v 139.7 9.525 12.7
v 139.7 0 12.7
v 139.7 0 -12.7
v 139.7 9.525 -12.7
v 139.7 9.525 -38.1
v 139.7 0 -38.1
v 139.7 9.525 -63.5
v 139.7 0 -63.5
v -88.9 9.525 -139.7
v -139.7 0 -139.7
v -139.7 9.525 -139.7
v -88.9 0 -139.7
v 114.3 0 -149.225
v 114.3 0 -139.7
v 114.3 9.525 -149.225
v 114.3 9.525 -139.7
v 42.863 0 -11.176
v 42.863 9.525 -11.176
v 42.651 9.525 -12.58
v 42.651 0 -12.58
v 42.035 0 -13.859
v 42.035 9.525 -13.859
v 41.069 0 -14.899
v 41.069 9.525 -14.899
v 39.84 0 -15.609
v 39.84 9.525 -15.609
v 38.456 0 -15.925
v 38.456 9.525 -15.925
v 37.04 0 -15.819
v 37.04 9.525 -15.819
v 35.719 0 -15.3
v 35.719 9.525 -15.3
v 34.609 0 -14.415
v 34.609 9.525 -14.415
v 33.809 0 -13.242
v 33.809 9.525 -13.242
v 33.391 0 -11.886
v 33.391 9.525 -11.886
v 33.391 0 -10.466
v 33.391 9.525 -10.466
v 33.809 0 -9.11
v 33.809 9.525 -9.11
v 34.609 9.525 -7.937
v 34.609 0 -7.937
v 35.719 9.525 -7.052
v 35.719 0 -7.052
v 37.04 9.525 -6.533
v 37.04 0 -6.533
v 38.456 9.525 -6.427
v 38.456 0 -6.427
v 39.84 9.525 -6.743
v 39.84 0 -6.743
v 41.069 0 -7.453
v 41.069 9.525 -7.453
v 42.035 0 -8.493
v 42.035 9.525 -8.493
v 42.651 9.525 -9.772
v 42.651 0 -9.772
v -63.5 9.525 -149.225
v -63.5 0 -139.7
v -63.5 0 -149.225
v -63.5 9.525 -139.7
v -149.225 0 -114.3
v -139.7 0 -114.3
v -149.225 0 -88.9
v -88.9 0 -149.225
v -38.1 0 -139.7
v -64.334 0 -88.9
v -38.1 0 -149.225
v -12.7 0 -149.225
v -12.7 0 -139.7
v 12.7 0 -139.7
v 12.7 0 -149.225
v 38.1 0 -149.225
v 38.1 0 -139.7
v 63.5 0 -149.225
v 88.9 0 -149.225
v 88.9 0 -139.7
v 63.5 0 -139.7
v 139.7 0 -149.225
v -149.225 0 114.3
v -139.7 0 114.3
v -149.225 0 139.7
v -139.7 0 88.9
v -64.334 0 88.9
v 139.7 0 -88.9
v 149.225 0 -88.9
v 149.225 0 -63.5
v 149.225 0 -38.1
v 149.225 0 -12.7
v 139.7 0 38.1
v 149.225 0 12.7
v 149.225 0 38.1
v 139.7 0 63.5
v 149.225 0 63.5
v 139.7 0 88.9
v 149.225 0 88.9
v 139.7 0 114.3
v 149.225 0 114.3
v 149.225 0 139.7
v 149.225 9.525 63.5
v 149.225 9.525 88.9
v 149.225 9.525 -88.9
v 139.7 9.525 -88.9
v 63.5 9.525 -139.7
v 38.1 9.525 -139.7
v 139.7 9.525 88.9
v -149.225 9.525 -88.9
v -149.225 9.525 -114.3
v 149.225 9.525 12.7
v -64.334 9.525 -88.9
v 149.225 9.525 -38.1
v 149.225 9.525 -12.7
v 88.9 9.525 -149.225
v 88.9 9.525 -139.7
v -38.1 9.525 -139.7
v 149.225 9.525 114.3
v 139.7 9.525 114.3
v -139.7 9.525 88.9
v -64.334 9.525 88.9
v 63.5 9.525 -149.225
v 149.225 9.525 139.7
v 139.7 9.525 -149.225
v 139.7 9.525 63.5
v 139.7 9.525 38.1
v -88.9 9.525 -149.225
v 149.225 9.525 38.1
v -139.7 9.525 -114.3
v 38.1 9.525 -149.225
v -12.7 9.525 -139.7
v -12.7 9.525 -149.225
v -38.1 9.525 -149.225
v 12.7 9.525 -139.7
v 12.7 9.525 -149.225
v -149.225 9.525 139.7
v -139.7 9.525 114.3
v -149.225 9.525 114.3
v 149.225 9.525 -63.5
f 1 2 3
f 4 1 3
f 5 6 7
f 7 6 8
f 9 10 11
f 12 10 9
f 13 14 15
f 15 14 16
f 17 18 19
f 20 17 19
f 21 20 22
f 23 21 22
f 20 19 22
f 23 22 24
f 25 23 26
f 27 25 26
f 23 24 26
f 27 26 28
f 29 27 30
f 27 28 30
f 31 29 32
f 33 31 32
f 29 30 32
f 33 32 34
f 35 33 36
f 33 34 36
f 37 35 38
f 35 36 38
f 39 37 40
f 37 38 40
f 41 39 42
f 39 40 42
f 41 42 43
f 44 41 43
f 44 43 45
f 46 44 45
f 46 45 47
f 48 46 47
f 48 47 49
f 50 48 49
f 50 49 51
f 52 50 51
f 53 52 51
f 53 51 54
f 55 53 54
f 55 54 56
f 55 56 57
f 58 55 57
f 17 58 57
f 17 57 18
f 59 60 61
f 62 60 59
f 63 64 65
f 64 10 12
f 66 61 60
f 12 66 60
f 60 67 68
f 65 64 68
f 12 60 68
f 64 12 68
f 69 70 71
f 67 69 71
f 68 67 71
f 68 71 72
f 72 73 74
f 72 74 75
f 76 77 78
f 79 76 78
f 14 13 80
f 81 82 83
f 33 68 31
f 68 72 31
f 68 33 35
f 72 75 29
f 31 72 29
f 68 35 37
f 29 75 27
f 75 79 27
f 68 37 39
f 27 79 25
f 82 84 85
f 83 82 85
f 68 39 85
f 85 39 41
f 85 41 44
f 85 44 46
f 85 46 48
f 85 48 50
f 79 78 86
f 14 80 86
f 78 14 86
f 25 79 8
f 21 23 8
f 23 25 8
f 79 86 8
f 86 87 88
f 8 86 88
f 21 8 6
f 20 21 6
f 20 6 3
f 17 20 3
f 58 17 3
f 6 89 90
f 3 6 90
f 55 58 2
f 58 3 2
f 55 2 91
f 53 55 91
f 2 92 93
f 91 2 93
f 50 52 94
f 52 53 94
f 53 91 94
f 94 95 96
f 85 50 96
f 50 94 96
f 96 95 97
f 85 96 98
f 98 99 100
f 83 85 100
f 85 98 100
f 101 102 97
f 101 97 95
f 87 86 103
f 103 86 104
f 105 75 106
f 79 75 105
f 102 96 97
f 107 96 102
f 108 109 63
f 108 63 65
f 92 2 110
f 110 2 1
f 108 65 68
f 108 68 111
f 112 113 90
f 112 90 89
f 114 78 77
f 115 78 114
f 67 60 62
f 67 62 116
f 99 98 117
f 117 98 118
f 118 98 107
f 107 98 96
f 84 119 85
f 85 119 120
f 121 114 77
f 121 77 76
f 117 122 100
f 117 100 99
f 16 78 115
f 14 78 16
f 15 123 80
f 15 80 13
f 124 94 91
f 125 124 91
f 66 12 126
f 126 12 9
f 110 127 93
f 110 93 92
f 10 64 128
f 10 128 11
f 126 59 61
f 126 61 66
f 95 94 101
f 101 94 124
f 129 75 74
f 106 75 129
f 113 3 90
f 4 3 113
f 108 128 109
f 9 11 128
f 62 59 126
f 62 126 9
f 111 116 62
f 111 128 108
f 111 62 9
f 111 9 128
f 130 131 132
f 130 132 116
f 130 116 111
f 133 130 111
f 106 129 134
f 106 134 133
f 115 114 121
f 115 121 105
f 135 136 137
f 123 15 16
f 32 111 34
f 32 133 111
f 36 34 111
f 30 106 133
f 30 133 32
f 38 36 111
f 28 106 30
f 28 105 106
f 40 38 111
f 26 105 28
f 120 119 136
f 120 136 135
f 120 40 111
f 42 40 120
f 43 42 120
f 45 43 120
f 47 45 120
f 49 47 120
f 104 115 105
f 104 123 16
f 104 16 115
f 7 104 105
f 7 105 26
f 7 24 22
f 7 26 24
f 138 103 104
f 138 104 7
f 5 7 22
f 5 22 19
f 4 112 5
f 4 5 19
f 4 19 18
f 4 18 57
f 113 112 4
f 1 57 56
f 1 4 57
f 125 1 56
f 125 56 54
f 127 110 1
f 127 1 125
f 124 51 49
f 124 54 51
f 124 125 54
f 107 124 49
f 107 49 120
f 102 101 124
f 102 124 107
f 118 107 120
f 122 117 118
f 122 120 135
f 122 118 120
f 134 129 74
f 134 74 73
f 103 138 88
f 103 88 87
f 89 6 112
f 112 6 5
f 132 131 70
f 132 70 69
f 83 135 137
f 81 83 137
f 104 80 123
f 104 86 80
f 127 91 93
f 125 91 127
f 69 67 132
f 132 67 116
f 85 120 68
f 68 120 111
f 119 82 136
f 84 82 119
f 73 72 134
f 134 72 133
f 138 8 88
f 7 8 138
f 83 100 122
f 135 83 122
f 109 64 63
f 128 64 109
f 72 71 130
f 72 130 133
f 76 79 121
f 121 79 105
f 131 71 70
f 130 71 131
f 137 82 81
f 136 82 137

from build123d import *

# Parameters (mm, degrees)
SKETCH1_W               = 279.4
SKETCH1_H               = 279.4
BOSS_EXTRUDE1_DEPTH     = 9.525
SKETCH2_W               = 25.4
SKETCH2_H               = 9.525
BOSS_EXTRUDE2_DEPTH     = 9.525
LPATTERN1_COUNT         = 5
LPATTERN1_PITCH         = 50.8
MIRROR1_COPY_1_SKETCH_W = 25.4
MIRROR1_COPY_1_SKETCH_H = 9.525
MIRROR1_COPY_1_DEPTH    = 9.525
MIRROR1_COPY_2_SKETCH_W = 25.4
MIRROR1_COPY_2_SKETCH_H = 9.525
MIRROR1_COPY_2_DEPTH    = 9.525
MIRROR1_COPY_3_SKETCH_W = 25.4
MIRROR1_COPY_3_SKETCH_H = 9.525
MIRROR1_COPY_3_DEPTH    = 9.525
MIRROR1_COPY_4_SKETCH_W = 25.4
MIRROR1_COPY_4_SKETCH_H = 9.525
MIRROR1_COPY_4_DEPTH    = 9.525
SKETCH3_W               = 25.4
SKETCH3_H               = 9.525
BOSS_EXTRUDE3_DEPTH     = 9.525
LPATTERN2_COUNT         = 5
LPATTERN2_PITCH         = 50.8
SKETCH6_R               = 4.7625
CUT_EXTRUDE1_DEPTH      = 10.525
SKETCH8_W               = 84.891093183
SKETCH8_H               = 177.8
CUT_EXTRUDE3_DEPTH      = 10.525
SKETCH9_W               = 25.4
SKETCH9_H               = 9.525
BOSS_EXTRUDE4_DEPTH     = 9.525


with BuildPart() as part:
    # Sketch1 → Boss-Extrude1 (new body)
    with BuildSketch(Plane(origin=(0, 0, 0), x_dir=(1, 0, 0), z_dir=(0, 1, 0))):
        Rectangle(SKETCH1_W, SKETCH1_H)
    extrude(amount=BOSS_EXTRUDE1_DEPTH)

    # Sketch2 → Boss-Extrude2 (add)
    with BuildSketch(Plane(origin=(139.7, 0, 0), x_dir=(0, 0, -1), z_dir=(1, 0, 0))):
        with Locations((-127, 4.7625)):
            Rectangle(SKETCH2_W, SKETCH2_H)
    boss_extrude2 = extrude(amount=BOSS_EXTRUDE2_DEPTH)

    # LPattern1: Boss-Extrude2 ×5
    with Locations(*[(0, 0, -i * LPATTERN1_PITCH) for i in range(1, LPATTERN1_COUNT)]):
        add(boss_extrude2)

    # Mirror1: Boss-Extrude2 across plane
    add(boss_extrude2.mirror(Plane(origin=(0, 0, 0), x_dir=(0, 0, 1), z_dir=(1, 0, 0))))

    # Mirror1 copy 1 sketch → Mirror1 copy 1 (add)
    with BuildSketch(Plane(origin=(-139.7, 0, -50.8), x_dir=(0, 0, -1), z_dir=(-1, 0, 0))):
        with Locations((-127, -4.7625)):
            Rectangle(MIRROR1_COPY_1_SKETCH_W, MIRROR1_COPY_1_SKETCH_H)
    extrude(amount=MIRROR1_COPY_1_DEPTH)

    # Mirror1 copy 2 sketch → Mirror1 copy 2 (add)
    with BuildSketch(Plane(origin=(-139.7, 0, -101.6), x_dir=(0, 0, -1), z_dir=(-1, 0, 0))):
        with Locations((-127, -4.7625)):
            Rectangle(MIRROR1_COPY_2_SKETCH_W, MIRROR1_COPY_2_SKETCH_H)
    extrude(amount=MIRROR1_COPY_2_DEPTH)

    # Mirror1 copy 3 sketch → Mirror1 copy 3 (add)
    with BuildSketch(Plane(origin=(-139.7, 0, -152.4), x_dir=(0, 0, -1), z_dir=(-1, 0, 0))):
        with Locations((-127, -4.7625)):
            Rectangle(MIRROR1_COPY_3_SKETCH_W, MIRROR1_COPY_3_SKETCH_H)
    extrude(amount=MIRROR1_COPY_3_DEPTH)

    # Mirror1 copy 4 sketch → Mirror1 copy 4 (add)
    with BuildSketch(Plane(origin=(-139.7, 0, -203.2), x_dir=(0, 0, -1), z_dir=(-1, 0, 0))):
        with Locations((-127, -4.7625)):
            Rectangle(MIRROR1_COPY_4_SKETCH_W, MIRROR1_COPY_4_SKETCH_H)
    extrude(amount=MIRROR1_COPY_4_DEPTH)

    # Sketch3 → Boss-Extrude3 (add)
    with BuildSketch(Plane(origin=(0, 0, -139.7), x_dir=(-1, 0, 0), z_dir=(0, 0, -1))):
        with Locations((-127, 4.7625)):
            Rectangle(SKETCH3_W, SKETCH3_H)
    boss_extrude3 = extrude(amount=BOSS_EXTRUDE3_DEPTH)

    # LPattern2: Boss-Extrude3 ×5
    with Locations(*[(-i * LPATTERN2_PITCH, 0, 0) for i in range(1, LPATTERN2_COUNT)]):
        add(boss_extrude3)

    # Sketch6 → Cut-Extrude1 (cut, through all)
    with BuildSketch(Plane(origin=(0, 9.525, 0), x_dir=(1, 0, 0), z_dir=(0, 1, 0))):
        with Locations((38.1, 11.176)):
            Circle(SKETCH6_R)
    extrude(amount=-CUT_EXTRUDE1_DEPTH, mode=Mode.SUBTRACT)

    # Sketch8 → Cut-Extrude3 (cut, through all)
    with BuildSketch(Plane(origin=(0, 9.525, 0), x_dir=(1, 0, 0), z_dir=(0, 1, 0))):
        with Locations((-106.779453409, 0)):
            Rectangle(SKETCH8_W, SKETCH8_H)
    extrude(amount=-CUT_EXTRUDE3_DEPTH, mode=Mode.SUBTRACT)

    # Sketch9 → Boss-Extrude4 (add)
    with BuildSketch(Plane.ZY.offset(139.7)):
        with Locations((-101.6, 4.7625)):
            Rectangle(SKETCH9_W, SKETCH9_H)
    extrude(amount=BOSS_EXTRUDE4_DEPTH)


solid = part.part
